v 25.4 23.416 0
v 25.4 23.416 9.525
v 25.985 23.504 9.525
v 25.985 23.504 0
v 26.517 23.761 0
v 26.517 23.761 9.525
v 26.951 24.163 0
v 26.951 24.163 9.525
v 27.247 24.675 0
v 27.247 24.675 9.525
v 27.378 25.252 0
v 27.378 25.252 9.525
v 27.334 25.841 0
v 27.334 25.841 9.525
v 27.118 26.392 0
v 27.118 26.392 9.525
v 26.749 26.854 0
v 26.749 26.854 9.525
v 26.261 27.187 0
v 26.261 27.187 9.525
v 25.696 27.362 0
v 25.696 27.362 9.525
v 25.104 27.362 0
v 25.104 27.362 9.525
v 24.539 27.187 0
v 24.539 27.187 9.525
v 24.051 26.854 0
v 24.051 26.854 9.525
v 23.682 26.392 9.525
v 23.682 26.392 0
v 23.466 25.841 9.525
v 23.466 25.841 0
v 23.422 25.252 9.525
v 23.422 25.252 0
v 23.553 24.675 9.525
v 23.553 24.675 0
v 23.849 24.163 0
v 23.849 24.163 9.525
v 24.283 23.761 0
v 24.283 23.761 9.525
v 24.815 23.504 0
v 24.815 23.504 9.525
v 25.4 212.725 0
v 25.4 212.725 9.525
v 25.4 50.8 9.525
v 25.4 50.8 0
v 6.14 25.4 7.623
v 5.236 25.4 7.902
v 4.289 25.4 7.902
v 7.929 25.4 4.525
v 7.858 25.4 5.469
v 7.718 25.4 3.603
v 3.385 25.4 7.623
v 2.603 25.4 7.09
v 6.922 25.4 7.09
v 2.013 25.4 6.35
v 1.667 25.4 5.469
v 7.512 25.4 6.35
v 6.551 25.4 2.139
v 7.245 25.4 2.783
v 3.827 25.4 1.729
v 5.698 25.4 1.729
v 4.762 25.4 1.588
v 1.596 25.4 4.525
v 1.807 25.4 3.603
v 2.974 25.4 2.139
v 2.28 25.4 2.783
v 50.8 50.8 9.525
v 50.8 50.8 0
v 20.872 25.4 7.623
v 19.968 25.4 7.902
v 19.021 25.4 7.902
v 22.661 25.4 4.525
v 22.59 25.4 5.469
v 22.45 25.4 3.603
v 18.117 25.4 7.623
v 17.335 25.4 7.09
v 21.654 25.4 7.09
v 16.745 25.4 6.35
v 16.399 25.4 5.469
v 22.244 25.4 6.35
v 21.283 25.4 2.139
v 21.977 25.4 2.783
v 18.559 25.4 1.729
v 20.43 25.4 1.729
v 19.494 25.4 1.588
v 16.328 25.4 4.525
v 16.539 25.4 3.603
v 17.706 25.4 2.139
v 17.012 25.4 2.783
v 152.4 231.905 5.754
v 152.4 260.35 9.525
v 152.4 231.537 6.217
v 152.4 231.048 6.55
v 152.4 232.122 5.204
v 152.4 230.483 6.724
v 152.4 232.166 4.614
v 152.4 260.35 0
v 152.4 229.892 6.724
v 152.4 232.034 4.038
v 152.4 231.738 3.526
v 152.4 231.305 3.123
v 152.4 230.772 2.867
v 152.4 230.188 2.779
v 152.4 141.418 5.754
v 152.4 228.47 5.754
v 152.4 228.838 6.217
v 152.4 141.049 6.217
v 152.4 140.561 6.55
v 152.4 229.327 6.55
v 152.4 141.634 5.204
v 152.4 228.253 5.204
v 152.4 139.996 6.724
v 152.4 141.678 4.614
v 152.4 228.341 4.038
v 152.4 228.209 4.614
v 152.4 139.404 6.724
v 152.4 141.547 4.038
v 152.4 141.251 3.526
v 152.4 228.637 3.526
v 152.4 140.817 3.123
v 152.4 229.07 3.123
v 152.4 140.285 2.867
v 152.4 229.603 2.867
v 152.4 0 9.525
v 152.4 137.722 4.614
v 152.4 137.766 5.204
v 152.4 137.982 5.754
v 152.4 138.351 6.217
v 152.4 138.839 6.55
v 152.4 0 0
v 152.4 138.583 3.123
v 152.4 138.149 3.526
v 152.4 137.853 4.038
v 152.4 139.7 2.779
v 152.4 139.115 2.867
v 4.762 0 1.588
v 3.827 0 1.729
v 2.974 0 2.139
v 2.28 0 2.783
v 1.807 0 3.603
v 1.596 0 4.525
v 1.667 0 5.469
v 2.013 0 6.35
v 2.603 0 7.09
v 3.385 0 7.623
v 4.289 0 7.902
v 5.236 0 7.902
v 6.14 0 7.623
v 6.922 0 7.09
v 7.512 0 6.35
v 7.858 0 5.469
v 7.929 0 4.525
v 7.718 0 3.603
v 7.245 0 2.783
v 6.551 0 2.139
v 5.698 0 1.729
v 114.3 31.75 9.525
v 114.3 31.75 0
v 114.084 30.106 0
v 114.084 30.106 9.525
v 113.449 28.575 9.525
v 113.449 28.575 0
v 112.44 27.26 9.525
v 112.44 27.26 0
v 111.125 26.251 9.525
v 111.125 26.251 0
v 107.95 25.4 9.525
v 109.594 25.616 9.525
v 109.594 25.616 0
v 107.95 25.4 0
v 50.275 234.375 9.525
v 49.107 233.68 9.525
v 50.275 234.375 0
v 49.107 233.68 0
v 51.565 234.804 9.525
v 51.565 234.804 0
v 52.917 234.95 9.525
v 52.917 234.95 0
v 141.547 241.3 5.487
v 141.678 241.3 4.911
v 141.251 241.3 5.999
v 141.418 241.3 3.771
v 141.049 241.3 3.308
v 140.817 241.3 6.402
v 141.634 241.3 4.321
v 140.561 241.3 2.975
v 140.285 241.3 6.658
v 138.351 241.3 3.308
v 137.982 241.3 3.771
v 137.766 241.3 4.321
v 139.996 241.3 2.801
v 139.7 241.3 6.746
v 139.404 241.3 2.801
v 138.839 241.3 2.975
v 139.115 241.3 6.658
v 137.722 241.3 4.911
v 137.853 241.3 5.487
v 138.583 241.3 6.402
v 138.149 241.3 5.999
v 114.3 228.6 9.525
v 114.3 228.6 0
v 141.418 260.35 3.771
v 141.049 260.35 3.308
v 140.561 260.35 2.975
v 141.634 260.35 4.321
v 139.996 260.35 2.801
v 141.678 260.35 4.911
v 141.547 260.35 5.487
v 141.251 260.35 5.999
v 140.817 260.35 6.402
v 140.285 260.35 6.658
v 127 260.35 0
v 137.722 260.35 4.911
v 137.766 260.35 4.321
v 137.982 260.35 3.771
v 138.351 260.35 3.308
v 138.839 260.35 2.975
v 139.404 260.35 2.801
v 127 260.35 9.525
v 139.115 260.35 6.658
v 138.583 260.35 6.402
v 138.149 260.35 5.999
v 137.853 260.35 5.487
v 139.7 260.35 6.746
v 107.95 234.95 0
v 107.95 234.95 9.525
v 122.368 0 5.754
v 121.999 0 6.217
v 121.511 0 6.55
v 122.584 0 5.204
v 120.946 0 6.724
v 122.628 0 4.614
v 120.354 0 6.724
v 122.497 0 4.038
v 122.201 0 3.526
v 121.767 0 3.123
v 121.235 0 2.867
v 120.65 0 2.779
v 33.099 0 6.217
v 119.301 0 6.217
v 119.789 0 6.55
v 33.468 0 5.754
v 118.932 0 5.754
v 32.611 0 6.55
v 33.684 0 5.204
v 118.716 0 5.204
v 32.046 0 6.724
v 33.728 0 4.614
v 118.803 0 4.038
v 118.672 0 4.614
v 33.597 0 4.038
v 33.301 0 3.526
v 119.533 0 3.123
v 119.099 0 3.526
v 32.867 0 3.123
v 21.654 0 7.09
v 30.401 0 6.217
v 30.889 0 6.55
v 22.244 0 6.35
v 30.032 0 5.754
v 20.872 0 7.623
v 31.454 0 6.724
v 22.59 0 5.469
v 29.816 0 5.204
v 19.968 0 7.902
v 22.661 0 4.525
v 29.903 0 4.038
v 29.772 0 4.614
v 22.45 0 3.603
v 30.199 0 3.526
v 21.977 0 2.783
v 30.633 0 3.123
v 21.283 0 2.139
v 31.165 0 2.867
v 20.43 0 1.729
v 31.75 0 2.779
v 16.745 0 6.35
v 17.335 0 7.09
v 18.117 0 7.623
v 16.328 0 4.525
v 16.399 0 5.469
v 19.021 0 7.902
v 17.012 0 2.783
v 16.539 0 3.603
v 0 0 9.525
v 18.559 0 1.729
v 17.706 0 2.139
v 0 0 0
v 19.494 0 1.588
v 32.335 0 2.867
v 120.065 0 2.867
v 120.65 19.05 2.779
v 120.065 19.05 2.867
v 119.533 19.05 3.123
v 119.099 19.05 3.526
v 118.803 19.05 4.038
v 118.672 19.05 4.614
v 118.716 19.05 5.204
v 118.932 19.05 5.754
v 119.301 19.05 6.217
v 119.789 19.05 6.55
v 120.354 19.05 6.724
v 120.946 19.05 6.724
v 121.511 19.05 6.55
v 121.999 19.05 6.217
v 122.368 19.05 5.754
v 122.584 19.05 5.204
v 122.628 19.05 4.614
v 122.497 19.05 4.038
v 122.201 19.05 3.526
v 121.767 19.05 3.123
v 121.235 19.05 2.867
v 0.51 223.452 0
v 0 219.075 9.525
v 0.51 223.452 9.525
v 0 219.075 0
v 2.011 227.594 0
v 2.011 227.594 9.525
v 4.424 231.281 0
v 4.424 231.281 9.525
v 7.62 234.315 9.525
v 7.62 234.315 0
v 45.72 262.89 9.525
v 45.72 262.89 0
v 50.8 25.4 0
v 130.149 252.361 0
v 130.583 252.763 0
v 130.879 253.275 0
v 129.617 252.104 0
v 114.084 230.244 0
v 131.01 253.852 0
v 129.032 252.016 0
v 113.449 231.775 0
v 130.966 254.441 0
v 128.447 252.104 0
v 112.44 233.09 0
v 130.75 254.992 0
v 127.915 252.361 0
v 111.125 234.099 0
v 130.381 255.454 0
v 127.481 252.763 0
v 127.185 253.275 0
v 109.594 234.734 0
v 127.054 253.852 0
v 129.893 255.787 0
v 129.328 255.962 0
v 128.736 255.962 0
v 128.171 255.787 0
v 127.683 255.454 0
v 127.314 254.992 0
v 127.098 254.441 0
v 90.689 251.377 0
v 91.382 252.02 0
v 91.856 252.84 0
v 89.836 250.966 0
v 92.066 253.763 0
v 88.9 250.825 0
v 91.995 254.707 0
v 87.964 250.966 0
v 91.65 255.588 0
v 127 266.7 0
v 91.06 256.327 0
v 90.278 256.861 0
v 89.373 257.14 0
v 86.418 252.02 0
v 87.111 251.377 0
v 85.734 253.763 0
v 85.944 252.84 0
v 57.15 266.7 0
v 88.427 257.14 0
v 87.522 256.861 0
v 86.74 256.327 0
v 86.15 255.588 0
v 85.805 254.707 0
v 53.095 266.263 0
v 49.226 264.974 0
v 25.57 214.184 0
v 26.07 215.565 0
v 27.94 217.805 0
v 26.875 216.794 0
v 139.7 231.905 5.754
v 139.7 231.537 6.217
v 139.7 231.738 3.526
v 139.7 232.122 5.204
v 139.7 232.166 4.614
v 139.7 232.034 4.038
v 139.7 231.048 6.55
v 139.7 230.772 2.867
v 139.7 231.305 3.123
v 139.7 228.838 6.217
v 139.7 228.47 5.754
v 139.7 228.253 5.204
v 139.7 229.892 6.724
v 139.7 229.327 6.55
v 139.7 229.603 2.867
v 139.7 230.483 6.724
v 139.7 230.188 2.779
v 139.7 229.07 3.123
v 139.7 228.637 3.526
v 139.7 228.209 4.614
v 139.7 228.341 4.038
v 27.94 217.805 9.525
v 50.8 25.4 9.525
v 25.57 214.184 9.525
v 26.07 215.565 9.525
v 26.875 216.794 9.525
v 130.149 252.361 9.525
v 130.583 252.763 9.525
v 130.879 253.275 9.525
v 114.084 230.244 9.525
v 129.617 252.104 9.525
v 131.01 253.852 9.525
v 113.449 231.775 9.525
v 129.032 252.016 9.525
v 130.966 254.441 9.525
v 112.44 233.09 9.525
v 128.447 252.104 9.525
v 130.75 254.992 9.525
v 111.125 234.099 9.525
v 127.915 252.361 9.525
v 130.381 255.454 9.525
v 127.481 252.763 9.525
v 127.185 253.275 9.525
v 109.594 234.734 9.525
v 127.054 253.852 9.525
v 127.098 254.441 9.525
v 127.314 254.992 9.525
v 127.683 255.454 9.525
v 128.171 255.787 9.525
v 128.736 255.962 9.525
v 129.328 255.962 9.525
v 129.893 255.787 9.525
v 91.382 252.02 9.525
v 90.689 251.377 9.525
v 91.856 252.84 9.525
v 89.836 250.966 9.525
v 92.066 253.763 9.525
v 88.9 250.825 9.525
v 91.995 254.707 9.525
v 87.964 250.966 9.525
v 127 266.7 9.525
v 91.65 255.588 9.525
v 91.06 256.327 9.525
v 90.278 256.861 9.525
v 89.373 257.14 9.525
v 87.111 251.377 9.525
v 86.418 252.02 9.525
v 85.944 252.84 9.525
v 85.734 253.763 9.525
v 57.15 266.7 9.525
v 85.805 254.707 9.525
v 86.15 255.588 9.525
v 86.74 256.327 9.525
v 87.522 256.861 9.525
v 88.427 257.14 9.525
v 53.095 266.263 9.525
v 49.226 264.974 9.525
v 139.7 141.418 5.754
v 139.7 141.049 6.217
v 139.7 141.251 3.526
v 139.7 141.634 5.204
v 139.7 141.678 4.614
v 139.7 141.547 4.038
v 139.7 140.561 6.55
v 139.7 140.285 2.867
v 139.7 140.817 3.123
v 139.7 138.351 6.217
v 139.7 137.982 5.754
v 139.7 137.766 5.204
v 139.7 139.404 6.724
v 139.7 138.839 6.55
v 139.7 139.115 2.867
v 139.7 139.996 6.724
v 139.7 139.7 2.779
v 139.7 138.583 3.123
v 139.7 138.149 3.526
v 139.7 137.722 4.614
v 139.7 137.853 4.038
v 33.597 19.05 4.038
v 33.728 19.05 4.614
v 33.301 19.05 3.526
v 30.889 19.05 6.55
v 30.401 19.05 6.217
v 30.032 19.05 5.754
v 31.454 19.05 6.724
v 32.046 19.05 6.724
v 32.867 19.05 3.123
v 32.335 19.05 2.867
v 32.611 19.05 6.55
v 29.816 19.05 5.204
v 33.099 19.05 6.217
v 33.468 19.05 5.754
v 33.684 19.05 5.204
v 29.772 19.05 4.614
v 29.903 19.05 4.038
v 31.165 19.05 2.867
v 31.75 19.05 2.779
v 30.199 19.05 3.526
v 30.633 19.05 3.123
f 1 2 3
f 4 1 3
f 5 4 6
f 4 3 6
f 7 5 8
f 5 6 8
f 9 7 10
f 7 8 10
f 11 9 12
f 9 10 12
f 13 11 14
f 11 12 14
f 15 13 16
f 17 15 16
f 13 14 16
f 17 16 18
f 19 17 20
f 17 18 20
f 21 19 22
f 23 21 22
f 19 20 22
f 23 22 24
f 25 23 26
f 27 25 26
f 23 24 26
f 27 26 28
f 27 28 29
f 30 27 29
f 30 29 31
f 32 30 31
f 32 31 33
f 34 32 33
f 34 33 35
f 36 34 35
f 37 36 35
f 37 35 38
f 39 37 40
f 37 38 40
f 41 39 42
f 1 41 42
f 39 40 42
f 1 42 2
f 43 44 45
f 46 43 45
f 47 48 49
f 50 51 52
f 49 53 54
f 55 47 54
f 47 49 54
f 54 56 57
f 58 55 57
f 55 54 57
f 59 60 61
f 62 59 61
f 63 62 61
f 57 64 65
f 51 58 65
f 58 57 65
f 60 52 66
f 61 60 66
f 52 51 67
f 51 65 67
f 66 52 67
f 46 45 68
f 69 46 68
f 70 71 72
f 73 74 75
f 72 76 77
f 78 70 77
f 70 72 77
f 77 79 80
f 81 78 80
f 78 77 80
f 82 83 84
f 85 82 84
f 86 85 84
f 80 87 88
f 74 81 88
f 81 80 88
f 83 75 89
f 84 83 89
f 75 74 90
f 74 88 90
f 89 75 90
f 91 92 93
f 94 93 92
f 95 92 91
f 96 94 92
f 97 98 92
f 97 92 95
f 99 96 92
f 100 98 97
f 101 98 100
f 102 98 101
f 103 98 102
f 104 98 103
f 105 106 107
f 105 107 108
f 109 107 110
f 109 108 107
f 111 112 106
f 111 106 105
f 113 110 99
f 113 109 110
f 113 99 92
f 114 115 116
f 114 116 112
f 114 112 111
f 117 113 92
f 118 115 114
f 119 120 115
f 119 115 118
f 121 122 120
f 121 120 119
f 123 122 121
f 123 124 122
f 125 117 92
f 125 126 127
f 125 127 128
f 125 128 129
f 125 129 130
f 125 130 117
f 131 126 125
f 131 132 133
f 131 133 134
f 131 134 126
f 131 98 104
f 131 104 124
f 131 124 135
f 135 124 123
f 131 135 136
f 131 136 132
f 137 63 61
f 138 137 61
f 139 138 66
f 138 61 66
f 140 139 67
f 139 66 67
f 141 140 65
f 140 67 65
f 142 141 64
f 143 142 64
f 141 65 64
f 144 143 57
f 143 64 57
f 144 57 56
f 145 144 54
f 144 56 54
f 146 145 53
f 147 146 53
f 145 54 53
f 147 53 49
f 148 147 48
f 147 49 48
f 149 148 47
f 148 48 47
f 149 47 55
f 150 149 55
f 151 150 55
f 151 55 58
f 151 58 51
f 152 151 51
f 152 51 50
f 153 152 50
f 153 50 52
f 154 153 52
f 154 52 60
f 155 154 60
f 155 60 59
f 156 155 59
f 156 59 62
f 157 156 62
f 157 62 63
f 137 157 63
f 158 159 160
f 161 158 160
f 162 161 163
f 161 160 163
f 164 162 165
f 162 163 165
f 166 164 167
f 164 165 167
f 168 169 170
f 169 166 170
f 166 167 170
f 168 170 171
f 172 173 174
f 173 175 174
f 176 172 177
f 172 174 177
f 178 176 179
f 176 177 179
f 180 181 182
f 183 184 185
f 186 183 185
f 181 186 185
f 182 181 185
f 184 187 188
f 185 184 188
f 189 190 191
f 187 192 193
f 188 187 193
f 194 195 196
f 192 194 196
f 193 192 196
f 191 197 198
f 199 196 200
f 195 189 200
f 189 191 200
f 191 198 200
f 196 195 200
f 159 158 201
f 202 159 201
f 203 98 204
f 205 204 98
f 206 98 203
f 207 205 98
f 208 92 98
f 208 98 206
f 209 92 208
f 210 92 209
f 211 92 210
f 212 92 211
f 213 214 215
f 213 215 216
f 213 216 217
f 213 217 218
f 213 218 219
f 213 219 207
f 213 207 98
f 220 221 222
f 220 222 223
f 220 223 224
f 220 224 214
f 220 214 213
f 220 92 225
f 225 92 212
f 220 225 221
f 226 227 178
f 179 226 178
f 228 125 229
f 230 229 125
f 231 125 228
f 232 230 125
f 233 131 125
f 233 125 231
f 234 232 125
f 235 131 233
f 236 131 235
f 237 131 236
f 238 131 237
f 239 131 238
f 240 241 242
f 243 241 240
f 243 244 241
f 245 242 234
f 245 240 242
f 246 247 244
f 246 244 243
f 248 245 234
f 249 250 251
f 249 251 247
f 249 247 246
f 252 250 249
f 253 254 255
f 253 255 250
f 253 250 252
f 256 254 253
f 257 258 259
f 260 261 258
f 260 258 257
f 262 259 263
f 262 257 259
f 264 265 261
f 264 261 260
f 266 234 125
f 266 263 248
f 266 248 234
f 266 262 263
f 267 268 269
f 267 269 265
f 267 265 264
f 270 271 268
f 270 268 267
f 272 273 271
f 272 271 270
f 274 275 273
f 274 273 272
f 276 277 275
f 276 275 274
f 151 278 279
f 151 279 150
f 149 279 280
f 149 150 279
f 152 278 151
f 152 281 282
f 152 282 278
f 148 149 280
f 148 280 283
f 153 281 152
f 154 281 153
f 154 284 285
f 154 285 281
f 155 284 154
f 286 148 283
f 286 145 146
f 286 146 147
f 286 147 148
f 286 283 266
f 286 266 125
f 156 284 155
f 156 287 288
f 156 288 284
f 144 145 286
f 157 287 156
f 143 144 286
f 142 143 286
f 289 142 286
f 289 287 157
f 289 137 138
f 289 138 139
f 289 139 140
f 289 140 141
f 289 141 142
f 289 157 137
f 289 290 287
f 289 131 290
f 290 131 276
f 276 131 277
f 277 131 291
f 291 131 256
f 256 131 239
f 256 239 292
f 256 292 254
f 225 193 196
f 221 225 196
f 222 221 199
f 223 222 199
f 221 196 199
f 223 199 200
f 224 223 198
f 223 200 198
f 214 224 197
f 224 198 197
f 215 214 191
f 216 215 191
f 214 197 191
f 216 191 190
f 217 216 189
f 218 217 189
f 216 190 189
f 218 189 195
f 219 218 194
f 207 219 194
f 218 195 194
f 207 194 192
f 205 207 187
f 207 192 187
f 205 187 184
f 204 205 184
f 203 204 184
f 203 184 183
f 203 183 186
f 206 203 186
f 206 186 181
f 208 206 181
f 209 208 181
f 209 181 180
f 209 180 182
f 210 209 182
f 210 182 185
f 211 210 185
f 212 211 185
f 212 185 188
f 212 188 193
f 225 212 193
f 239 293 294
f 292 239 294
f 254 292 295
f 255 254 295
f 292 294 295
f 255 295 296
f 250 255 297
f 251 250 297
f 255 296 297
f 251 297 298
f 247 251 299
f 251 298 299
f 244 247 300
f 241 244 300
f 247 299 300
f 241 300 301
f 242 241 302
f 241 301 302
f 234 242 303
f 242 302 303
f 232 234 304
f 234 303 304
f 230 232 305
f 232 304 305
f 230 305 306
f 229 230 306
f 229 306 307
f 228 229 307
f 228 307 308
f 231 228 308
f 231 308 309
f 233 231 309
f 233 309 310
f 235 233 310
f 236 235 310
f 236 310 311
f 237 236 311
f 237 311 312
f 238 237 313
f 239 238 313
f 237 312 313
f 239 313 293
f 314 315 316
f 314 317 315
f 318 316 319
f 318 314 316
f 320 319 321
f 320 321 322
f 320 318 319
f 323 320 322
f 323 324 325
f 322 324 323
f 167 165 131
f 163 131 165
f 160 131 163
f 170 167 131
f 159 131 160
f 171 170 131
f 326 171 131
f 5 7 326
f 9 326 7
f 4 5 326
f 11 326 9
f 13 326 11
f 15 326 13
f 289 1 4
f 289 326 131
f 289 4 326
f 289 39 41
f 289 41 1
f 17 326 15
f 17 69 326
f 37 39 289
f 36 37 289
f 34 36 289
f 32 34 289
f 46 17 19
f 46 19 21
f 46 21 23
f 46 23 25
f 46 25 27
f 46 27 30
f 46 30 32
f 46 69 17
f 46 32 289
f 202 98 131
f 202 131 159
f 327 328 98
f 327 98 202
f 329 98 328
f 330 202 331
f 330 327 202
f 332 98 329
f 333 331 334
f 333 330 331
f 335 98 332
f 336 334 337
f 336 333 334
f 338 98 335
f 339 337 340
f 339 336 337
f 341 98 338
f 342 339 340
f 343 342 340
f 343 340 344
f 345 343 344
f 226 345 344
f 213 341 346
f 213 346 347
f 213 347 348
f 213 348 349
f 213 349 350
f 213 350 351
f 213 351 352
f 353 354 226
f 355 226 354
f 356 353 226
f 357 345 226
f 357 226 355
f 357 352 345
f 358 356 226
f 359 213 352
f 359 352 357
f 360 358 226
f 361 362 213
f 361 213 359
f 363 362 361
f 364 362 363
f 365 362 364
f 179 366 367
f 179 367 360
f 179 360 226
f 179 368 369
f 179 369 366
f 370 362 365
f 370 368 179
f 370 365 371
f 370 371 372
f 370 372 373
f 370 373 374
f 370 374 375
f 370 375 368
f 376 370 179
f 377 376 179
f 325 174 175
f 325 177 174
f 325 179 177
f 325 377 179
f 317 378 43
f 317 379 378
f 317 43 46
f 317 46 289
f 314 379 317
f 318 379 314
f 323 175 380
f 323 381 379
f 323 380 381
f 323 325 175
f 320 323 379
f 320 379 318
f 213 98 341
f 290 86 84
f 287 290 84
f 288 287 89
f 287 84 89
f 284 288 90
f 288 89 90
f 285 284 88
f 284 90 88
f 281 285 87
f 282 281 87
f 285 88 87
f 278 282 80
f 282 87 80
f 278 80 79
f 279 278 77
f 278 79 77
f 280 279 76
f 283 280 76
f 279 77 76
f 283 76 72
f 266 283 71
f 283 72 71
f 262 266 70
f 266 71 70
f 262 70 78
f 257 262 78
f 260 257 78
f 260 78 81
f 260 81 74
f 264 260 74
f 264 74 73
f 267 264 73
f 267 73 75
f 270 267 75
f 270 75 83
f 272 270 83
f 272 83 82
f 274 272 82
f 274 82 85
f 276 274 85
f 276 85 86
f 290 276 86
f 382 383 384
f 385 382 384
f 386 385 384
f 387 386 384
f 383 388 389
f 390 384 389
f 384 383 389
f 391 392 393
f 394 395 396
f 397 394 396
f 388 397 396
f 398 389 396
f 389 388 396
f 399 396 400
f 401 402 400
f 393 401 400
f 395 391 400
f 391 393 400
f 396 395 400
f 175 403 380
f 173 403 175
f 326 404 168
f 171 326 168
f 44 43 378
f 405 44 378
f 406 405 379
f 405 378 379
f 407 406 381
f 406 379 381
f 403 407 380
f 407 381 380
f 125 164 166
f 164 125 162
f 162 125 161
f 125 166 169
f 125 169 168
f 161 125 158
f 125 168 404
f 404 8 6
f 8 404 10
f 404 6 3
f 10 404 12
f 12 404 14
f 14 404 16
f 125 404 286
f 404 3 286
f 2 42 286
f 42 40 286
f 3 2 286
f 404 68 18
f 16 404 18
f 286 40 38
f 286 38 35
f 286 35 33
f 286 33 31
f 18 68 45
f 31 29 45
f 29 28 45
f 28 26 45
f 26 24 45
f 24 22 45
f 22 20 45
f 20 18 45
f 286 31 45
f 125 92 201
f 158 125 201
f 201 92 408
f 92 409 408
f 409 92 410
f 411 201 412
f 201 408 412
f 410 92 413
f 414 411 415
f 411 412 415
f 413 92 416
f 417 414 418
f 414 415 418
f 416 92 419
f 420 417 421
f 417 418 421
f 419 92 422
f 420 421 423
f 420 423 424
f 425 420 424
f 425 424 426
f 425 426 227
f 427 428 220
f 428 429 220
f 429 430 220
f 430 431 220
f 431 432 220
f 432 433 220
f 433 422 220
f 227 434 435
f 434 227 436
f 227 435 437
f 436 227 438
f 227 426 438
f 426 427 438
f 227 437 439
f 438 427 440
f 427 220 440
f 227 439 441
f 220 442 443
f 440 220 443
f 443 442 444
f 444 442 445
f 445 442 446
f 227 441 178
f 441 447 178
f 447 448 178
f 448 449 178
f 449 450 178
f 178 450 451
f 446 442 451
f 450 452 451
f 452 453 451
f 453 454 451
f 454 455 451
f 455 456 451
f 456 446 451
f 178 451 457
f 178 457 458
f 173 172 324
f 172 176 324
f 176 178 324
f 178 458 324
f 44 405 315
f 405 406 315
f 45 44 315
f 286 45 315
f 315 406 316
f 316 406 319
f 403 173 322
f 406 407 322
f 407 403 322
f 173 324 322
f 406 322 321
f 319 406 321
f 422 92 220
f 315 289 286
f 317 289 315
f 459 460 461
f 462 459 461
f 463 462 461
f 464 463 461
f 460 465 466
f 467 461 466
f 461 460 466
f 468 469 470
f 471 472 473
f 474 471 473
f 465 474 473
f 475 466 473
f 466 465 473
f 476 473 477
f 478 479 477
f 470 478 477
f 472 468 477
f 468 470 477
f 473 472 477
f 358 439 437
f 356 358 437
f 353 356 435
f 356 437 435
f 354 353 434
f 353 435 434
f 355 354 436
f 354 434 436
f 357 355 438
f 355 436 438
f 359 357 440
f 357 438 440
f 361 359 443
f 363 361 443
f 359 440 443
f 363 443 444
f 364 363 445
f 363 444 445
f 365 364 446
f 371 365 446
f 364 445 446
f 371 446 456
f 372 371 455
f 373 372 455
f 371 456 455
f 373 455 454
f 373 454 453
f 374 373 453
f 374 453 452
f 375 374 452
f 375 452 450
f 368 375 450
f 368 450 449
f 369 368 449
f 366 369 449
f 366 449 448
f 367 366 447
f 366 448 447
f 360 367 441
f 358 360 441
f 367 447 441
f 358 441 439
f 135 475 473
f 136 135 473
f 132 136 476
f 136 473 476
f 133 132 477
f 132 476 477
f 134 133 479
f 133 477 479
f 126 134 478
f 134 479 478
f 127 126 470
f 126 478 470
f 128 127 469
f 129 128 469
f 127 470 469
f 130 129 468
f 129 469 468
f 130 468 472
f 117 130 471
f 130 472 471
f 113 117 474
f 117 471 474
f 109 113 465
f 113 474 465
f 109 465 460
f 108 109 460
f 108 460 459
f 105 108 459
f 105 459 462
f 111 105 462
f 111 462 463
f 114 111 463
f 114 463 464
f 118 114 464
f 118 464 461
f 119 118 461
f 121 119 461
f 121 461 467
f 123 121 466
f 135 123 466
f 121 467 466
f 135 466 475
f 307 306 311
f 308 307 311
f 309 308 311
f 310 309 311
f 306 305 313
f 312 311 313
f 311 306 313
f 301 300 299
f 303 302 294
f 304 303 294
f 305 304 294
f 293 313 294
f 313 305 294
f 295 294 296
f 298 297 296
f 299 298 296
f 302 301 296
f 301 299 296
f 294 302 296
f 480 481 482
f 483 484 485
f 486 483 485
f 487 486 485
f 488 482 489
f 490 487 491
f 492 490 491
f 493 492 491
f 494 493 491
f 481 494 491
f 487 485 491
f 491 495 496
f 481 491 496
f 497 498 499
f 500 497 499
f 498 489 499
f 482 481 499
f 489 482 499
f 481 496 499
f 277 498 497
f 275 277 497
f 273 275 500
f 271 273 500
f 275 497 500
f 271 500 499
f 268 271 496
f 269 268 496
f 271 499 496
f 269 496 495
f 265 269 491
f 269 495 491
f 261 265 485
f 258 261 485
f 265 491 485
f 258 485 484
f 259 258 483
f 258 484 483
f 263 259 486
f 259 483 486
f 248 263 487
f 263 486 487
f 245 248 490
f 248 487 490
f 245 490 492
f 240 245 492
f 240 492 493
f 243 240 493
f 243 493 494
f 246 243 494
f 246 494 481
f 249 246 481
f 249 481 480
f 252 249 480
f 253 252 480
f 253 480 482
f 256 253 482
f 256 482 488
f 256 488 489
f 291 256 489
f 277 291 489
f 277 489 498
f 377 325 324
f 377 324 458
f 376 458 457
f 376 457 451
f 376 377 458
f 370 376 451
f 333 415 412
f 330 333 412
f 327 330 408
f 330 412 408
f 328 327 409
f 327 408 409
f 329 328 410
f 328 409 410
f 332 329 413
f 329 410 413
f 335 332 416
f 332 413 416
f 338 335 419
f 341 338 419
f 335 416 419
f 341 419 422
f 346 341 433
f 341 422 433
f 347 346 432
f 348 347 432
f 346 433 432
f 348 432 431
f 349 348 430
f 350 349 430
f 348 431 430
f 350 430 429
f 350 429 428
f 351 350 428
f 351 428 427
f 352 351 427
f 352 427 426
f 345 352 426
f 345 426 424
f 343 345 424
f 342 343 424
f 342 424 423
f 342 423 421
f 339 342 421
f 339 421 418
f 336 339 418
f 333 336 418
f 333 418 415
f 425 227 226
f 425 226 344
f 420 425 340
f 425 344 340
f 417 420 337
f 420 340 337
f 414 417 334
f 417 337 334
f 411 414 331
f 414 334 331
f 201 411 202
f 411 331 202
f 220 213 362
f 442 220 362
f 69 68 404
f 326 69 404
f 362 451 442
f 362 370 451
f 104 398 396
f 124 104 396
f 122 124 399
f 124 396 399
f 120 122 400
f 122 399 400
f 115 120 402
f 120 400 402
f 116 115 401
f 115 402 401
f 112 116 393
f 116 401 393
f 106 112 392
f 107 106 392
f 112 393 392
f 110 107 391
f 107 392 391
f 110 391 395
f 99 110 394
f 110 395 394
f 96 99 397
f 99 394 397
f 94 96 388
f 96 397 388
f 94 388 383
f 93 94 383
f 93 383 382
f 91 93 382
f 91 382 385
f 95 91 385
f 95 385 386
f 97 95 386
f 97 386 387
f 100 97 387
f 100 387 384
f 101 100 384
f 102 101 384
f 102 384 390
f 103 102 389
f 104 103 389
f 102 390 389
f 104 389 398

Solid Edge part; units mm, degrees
sketch "Sketch1" plane through (0, 0, 0) normal (0, 0, 1) x (1, 0, 0)
  line L0 (0, 0) -> (0, 266.7)
  line L1 (0, 266.7) -> (152.4, 266.7)
  line L2 (152.4, 266.7) -> (152.4, 0)
  line L3 (152.4, 0) -> (0, 0)
  dimension "D1" = 152.4
  dimension "D2" = 266.7
extrude "Protrusion1" add sketch "Sketch1" along normal blind 9.525
hole "Hole_1" at (88.9, 254, 9.525) direction (0, 0, -1) diameter 6.35 end through all
sketch "Sketch2" plane through (76.2, 133.35, 9.525) normal (0, 0, 1) x (1, 0, 0)
  line L0 (-76.2, 133.35) -> (-25.4, 133.35)
  line L1 (-25.4, 133.35) -> (-76.2, 95.25)
  line L2 (-76.2, 95.25) -> (-76.2, 133.35)
  dimension "D1" = 50.8
  dimension "D2" = 38.1
extrude "Cutout1" cut sketch "Sketch2" against normal through all
sketch "Sketch3" plane through (38.1, 127, 9.525) normal (0, 0, 1) x (1, 0, 0)
  line L0 (-12.7, 88.9) -> (-12.7, -76.2)
  line L1 (-12.7, -76.2) -> (12.7, -76.2)
  line L2 (12.7, -76.2) -> (12.7, -101.6)
  line L3 (12.7, -101.6) -> (76.2, -101.6)
  line L4 (76.2, -101.6) -> (76.2, 107.95)
  line L5 (76.2, 107.95) -> (12.7, 107.95)
  line L6 (-12.7, 88.9) -> (12.7, 107.95)
  dimension "D1" = 31.75
  dimension "D2" = 25.4
  dimension "D3" = 25.4
  dimension "D4" = 63.5
  dimension "D5" = 25.4
  dimension "D6" = 50.8
  dimension "D7" = 50.8
extrude "Cutout2" cut sketch "Sketch3" against normal through all
sketch "Sketch4" plane through (44.45, 133.35, 9.525) normal (0, 0, 1) x (1, 0, 0)
  line L0 (107.95, 133.35) -> (107.95, 127)
  line L1 (107.95, 127) -> (82.55, 127)
  line L2 (82.55, 127) -> (82.55, 133.35)
  line L3 (82.55, 133.35) -> (107.95, 133.35)
  dimension "D1" = 6.35
  dimension "D2" = 25.4
extrude "Cutout3" cut sketch "Sketch4" against normal through all
hole "Hole_9" at (120.65, 0, 4.7625) direction (0, 1, 0) diameter 3.9675 depth 19.05
hole "Hole1" at (31.75, 0, 4.7625) direction (0, 1, 0) diameter 3.9675 depth 19.05
hole "Hole_3" at (139.7, 260.35, 4.7625) direction (0, -1, 0) diameter 3.9675 depth 19.05
hole "Hole2" [suppressed]
hole "Hole_4a" at (25.4, 25.4, 9.525) direction (0, 0, -1) diameter 3.9675 end through all
fillet "Round_1" radius 19.05 2 edges at (0, 228.6, 4.7625) (50.8, 266.7, 4.7625)
fillet "Round_2" radius 6.35 4 edges at (50.8, 234.95, 4.7625) (114.3, 234.95, 4.7625) (114.3, 25.4, 4.7625) (25.4, 215.9, 4.7625)
hole "Hole3" at (19.4945, 0, 4.7625) direction (0, 1, 0) diameter 6.35 depth 25.4
hole "Hole4" at (4.7625, 0, 4.7625) direction (0, 1, 0) diameter 6.35 depth 25.4
hole "Hole_16" at (152.4, 230.1875, 4.7625) direction (-1, 0, 0) diameter 3.9675 depth 12.7
hole "Hole5" at (152.4, 139.7, 4.7625) direction (-1, 0, 0) diameter 3.9675 depth 12.7
hole "Hole_18" at (129.032, 254, 9.525) direction (0, 0, -1) diameter 3.9675 end up to next
properties part number "CHAS-02" material "Polyethylene, low density"
